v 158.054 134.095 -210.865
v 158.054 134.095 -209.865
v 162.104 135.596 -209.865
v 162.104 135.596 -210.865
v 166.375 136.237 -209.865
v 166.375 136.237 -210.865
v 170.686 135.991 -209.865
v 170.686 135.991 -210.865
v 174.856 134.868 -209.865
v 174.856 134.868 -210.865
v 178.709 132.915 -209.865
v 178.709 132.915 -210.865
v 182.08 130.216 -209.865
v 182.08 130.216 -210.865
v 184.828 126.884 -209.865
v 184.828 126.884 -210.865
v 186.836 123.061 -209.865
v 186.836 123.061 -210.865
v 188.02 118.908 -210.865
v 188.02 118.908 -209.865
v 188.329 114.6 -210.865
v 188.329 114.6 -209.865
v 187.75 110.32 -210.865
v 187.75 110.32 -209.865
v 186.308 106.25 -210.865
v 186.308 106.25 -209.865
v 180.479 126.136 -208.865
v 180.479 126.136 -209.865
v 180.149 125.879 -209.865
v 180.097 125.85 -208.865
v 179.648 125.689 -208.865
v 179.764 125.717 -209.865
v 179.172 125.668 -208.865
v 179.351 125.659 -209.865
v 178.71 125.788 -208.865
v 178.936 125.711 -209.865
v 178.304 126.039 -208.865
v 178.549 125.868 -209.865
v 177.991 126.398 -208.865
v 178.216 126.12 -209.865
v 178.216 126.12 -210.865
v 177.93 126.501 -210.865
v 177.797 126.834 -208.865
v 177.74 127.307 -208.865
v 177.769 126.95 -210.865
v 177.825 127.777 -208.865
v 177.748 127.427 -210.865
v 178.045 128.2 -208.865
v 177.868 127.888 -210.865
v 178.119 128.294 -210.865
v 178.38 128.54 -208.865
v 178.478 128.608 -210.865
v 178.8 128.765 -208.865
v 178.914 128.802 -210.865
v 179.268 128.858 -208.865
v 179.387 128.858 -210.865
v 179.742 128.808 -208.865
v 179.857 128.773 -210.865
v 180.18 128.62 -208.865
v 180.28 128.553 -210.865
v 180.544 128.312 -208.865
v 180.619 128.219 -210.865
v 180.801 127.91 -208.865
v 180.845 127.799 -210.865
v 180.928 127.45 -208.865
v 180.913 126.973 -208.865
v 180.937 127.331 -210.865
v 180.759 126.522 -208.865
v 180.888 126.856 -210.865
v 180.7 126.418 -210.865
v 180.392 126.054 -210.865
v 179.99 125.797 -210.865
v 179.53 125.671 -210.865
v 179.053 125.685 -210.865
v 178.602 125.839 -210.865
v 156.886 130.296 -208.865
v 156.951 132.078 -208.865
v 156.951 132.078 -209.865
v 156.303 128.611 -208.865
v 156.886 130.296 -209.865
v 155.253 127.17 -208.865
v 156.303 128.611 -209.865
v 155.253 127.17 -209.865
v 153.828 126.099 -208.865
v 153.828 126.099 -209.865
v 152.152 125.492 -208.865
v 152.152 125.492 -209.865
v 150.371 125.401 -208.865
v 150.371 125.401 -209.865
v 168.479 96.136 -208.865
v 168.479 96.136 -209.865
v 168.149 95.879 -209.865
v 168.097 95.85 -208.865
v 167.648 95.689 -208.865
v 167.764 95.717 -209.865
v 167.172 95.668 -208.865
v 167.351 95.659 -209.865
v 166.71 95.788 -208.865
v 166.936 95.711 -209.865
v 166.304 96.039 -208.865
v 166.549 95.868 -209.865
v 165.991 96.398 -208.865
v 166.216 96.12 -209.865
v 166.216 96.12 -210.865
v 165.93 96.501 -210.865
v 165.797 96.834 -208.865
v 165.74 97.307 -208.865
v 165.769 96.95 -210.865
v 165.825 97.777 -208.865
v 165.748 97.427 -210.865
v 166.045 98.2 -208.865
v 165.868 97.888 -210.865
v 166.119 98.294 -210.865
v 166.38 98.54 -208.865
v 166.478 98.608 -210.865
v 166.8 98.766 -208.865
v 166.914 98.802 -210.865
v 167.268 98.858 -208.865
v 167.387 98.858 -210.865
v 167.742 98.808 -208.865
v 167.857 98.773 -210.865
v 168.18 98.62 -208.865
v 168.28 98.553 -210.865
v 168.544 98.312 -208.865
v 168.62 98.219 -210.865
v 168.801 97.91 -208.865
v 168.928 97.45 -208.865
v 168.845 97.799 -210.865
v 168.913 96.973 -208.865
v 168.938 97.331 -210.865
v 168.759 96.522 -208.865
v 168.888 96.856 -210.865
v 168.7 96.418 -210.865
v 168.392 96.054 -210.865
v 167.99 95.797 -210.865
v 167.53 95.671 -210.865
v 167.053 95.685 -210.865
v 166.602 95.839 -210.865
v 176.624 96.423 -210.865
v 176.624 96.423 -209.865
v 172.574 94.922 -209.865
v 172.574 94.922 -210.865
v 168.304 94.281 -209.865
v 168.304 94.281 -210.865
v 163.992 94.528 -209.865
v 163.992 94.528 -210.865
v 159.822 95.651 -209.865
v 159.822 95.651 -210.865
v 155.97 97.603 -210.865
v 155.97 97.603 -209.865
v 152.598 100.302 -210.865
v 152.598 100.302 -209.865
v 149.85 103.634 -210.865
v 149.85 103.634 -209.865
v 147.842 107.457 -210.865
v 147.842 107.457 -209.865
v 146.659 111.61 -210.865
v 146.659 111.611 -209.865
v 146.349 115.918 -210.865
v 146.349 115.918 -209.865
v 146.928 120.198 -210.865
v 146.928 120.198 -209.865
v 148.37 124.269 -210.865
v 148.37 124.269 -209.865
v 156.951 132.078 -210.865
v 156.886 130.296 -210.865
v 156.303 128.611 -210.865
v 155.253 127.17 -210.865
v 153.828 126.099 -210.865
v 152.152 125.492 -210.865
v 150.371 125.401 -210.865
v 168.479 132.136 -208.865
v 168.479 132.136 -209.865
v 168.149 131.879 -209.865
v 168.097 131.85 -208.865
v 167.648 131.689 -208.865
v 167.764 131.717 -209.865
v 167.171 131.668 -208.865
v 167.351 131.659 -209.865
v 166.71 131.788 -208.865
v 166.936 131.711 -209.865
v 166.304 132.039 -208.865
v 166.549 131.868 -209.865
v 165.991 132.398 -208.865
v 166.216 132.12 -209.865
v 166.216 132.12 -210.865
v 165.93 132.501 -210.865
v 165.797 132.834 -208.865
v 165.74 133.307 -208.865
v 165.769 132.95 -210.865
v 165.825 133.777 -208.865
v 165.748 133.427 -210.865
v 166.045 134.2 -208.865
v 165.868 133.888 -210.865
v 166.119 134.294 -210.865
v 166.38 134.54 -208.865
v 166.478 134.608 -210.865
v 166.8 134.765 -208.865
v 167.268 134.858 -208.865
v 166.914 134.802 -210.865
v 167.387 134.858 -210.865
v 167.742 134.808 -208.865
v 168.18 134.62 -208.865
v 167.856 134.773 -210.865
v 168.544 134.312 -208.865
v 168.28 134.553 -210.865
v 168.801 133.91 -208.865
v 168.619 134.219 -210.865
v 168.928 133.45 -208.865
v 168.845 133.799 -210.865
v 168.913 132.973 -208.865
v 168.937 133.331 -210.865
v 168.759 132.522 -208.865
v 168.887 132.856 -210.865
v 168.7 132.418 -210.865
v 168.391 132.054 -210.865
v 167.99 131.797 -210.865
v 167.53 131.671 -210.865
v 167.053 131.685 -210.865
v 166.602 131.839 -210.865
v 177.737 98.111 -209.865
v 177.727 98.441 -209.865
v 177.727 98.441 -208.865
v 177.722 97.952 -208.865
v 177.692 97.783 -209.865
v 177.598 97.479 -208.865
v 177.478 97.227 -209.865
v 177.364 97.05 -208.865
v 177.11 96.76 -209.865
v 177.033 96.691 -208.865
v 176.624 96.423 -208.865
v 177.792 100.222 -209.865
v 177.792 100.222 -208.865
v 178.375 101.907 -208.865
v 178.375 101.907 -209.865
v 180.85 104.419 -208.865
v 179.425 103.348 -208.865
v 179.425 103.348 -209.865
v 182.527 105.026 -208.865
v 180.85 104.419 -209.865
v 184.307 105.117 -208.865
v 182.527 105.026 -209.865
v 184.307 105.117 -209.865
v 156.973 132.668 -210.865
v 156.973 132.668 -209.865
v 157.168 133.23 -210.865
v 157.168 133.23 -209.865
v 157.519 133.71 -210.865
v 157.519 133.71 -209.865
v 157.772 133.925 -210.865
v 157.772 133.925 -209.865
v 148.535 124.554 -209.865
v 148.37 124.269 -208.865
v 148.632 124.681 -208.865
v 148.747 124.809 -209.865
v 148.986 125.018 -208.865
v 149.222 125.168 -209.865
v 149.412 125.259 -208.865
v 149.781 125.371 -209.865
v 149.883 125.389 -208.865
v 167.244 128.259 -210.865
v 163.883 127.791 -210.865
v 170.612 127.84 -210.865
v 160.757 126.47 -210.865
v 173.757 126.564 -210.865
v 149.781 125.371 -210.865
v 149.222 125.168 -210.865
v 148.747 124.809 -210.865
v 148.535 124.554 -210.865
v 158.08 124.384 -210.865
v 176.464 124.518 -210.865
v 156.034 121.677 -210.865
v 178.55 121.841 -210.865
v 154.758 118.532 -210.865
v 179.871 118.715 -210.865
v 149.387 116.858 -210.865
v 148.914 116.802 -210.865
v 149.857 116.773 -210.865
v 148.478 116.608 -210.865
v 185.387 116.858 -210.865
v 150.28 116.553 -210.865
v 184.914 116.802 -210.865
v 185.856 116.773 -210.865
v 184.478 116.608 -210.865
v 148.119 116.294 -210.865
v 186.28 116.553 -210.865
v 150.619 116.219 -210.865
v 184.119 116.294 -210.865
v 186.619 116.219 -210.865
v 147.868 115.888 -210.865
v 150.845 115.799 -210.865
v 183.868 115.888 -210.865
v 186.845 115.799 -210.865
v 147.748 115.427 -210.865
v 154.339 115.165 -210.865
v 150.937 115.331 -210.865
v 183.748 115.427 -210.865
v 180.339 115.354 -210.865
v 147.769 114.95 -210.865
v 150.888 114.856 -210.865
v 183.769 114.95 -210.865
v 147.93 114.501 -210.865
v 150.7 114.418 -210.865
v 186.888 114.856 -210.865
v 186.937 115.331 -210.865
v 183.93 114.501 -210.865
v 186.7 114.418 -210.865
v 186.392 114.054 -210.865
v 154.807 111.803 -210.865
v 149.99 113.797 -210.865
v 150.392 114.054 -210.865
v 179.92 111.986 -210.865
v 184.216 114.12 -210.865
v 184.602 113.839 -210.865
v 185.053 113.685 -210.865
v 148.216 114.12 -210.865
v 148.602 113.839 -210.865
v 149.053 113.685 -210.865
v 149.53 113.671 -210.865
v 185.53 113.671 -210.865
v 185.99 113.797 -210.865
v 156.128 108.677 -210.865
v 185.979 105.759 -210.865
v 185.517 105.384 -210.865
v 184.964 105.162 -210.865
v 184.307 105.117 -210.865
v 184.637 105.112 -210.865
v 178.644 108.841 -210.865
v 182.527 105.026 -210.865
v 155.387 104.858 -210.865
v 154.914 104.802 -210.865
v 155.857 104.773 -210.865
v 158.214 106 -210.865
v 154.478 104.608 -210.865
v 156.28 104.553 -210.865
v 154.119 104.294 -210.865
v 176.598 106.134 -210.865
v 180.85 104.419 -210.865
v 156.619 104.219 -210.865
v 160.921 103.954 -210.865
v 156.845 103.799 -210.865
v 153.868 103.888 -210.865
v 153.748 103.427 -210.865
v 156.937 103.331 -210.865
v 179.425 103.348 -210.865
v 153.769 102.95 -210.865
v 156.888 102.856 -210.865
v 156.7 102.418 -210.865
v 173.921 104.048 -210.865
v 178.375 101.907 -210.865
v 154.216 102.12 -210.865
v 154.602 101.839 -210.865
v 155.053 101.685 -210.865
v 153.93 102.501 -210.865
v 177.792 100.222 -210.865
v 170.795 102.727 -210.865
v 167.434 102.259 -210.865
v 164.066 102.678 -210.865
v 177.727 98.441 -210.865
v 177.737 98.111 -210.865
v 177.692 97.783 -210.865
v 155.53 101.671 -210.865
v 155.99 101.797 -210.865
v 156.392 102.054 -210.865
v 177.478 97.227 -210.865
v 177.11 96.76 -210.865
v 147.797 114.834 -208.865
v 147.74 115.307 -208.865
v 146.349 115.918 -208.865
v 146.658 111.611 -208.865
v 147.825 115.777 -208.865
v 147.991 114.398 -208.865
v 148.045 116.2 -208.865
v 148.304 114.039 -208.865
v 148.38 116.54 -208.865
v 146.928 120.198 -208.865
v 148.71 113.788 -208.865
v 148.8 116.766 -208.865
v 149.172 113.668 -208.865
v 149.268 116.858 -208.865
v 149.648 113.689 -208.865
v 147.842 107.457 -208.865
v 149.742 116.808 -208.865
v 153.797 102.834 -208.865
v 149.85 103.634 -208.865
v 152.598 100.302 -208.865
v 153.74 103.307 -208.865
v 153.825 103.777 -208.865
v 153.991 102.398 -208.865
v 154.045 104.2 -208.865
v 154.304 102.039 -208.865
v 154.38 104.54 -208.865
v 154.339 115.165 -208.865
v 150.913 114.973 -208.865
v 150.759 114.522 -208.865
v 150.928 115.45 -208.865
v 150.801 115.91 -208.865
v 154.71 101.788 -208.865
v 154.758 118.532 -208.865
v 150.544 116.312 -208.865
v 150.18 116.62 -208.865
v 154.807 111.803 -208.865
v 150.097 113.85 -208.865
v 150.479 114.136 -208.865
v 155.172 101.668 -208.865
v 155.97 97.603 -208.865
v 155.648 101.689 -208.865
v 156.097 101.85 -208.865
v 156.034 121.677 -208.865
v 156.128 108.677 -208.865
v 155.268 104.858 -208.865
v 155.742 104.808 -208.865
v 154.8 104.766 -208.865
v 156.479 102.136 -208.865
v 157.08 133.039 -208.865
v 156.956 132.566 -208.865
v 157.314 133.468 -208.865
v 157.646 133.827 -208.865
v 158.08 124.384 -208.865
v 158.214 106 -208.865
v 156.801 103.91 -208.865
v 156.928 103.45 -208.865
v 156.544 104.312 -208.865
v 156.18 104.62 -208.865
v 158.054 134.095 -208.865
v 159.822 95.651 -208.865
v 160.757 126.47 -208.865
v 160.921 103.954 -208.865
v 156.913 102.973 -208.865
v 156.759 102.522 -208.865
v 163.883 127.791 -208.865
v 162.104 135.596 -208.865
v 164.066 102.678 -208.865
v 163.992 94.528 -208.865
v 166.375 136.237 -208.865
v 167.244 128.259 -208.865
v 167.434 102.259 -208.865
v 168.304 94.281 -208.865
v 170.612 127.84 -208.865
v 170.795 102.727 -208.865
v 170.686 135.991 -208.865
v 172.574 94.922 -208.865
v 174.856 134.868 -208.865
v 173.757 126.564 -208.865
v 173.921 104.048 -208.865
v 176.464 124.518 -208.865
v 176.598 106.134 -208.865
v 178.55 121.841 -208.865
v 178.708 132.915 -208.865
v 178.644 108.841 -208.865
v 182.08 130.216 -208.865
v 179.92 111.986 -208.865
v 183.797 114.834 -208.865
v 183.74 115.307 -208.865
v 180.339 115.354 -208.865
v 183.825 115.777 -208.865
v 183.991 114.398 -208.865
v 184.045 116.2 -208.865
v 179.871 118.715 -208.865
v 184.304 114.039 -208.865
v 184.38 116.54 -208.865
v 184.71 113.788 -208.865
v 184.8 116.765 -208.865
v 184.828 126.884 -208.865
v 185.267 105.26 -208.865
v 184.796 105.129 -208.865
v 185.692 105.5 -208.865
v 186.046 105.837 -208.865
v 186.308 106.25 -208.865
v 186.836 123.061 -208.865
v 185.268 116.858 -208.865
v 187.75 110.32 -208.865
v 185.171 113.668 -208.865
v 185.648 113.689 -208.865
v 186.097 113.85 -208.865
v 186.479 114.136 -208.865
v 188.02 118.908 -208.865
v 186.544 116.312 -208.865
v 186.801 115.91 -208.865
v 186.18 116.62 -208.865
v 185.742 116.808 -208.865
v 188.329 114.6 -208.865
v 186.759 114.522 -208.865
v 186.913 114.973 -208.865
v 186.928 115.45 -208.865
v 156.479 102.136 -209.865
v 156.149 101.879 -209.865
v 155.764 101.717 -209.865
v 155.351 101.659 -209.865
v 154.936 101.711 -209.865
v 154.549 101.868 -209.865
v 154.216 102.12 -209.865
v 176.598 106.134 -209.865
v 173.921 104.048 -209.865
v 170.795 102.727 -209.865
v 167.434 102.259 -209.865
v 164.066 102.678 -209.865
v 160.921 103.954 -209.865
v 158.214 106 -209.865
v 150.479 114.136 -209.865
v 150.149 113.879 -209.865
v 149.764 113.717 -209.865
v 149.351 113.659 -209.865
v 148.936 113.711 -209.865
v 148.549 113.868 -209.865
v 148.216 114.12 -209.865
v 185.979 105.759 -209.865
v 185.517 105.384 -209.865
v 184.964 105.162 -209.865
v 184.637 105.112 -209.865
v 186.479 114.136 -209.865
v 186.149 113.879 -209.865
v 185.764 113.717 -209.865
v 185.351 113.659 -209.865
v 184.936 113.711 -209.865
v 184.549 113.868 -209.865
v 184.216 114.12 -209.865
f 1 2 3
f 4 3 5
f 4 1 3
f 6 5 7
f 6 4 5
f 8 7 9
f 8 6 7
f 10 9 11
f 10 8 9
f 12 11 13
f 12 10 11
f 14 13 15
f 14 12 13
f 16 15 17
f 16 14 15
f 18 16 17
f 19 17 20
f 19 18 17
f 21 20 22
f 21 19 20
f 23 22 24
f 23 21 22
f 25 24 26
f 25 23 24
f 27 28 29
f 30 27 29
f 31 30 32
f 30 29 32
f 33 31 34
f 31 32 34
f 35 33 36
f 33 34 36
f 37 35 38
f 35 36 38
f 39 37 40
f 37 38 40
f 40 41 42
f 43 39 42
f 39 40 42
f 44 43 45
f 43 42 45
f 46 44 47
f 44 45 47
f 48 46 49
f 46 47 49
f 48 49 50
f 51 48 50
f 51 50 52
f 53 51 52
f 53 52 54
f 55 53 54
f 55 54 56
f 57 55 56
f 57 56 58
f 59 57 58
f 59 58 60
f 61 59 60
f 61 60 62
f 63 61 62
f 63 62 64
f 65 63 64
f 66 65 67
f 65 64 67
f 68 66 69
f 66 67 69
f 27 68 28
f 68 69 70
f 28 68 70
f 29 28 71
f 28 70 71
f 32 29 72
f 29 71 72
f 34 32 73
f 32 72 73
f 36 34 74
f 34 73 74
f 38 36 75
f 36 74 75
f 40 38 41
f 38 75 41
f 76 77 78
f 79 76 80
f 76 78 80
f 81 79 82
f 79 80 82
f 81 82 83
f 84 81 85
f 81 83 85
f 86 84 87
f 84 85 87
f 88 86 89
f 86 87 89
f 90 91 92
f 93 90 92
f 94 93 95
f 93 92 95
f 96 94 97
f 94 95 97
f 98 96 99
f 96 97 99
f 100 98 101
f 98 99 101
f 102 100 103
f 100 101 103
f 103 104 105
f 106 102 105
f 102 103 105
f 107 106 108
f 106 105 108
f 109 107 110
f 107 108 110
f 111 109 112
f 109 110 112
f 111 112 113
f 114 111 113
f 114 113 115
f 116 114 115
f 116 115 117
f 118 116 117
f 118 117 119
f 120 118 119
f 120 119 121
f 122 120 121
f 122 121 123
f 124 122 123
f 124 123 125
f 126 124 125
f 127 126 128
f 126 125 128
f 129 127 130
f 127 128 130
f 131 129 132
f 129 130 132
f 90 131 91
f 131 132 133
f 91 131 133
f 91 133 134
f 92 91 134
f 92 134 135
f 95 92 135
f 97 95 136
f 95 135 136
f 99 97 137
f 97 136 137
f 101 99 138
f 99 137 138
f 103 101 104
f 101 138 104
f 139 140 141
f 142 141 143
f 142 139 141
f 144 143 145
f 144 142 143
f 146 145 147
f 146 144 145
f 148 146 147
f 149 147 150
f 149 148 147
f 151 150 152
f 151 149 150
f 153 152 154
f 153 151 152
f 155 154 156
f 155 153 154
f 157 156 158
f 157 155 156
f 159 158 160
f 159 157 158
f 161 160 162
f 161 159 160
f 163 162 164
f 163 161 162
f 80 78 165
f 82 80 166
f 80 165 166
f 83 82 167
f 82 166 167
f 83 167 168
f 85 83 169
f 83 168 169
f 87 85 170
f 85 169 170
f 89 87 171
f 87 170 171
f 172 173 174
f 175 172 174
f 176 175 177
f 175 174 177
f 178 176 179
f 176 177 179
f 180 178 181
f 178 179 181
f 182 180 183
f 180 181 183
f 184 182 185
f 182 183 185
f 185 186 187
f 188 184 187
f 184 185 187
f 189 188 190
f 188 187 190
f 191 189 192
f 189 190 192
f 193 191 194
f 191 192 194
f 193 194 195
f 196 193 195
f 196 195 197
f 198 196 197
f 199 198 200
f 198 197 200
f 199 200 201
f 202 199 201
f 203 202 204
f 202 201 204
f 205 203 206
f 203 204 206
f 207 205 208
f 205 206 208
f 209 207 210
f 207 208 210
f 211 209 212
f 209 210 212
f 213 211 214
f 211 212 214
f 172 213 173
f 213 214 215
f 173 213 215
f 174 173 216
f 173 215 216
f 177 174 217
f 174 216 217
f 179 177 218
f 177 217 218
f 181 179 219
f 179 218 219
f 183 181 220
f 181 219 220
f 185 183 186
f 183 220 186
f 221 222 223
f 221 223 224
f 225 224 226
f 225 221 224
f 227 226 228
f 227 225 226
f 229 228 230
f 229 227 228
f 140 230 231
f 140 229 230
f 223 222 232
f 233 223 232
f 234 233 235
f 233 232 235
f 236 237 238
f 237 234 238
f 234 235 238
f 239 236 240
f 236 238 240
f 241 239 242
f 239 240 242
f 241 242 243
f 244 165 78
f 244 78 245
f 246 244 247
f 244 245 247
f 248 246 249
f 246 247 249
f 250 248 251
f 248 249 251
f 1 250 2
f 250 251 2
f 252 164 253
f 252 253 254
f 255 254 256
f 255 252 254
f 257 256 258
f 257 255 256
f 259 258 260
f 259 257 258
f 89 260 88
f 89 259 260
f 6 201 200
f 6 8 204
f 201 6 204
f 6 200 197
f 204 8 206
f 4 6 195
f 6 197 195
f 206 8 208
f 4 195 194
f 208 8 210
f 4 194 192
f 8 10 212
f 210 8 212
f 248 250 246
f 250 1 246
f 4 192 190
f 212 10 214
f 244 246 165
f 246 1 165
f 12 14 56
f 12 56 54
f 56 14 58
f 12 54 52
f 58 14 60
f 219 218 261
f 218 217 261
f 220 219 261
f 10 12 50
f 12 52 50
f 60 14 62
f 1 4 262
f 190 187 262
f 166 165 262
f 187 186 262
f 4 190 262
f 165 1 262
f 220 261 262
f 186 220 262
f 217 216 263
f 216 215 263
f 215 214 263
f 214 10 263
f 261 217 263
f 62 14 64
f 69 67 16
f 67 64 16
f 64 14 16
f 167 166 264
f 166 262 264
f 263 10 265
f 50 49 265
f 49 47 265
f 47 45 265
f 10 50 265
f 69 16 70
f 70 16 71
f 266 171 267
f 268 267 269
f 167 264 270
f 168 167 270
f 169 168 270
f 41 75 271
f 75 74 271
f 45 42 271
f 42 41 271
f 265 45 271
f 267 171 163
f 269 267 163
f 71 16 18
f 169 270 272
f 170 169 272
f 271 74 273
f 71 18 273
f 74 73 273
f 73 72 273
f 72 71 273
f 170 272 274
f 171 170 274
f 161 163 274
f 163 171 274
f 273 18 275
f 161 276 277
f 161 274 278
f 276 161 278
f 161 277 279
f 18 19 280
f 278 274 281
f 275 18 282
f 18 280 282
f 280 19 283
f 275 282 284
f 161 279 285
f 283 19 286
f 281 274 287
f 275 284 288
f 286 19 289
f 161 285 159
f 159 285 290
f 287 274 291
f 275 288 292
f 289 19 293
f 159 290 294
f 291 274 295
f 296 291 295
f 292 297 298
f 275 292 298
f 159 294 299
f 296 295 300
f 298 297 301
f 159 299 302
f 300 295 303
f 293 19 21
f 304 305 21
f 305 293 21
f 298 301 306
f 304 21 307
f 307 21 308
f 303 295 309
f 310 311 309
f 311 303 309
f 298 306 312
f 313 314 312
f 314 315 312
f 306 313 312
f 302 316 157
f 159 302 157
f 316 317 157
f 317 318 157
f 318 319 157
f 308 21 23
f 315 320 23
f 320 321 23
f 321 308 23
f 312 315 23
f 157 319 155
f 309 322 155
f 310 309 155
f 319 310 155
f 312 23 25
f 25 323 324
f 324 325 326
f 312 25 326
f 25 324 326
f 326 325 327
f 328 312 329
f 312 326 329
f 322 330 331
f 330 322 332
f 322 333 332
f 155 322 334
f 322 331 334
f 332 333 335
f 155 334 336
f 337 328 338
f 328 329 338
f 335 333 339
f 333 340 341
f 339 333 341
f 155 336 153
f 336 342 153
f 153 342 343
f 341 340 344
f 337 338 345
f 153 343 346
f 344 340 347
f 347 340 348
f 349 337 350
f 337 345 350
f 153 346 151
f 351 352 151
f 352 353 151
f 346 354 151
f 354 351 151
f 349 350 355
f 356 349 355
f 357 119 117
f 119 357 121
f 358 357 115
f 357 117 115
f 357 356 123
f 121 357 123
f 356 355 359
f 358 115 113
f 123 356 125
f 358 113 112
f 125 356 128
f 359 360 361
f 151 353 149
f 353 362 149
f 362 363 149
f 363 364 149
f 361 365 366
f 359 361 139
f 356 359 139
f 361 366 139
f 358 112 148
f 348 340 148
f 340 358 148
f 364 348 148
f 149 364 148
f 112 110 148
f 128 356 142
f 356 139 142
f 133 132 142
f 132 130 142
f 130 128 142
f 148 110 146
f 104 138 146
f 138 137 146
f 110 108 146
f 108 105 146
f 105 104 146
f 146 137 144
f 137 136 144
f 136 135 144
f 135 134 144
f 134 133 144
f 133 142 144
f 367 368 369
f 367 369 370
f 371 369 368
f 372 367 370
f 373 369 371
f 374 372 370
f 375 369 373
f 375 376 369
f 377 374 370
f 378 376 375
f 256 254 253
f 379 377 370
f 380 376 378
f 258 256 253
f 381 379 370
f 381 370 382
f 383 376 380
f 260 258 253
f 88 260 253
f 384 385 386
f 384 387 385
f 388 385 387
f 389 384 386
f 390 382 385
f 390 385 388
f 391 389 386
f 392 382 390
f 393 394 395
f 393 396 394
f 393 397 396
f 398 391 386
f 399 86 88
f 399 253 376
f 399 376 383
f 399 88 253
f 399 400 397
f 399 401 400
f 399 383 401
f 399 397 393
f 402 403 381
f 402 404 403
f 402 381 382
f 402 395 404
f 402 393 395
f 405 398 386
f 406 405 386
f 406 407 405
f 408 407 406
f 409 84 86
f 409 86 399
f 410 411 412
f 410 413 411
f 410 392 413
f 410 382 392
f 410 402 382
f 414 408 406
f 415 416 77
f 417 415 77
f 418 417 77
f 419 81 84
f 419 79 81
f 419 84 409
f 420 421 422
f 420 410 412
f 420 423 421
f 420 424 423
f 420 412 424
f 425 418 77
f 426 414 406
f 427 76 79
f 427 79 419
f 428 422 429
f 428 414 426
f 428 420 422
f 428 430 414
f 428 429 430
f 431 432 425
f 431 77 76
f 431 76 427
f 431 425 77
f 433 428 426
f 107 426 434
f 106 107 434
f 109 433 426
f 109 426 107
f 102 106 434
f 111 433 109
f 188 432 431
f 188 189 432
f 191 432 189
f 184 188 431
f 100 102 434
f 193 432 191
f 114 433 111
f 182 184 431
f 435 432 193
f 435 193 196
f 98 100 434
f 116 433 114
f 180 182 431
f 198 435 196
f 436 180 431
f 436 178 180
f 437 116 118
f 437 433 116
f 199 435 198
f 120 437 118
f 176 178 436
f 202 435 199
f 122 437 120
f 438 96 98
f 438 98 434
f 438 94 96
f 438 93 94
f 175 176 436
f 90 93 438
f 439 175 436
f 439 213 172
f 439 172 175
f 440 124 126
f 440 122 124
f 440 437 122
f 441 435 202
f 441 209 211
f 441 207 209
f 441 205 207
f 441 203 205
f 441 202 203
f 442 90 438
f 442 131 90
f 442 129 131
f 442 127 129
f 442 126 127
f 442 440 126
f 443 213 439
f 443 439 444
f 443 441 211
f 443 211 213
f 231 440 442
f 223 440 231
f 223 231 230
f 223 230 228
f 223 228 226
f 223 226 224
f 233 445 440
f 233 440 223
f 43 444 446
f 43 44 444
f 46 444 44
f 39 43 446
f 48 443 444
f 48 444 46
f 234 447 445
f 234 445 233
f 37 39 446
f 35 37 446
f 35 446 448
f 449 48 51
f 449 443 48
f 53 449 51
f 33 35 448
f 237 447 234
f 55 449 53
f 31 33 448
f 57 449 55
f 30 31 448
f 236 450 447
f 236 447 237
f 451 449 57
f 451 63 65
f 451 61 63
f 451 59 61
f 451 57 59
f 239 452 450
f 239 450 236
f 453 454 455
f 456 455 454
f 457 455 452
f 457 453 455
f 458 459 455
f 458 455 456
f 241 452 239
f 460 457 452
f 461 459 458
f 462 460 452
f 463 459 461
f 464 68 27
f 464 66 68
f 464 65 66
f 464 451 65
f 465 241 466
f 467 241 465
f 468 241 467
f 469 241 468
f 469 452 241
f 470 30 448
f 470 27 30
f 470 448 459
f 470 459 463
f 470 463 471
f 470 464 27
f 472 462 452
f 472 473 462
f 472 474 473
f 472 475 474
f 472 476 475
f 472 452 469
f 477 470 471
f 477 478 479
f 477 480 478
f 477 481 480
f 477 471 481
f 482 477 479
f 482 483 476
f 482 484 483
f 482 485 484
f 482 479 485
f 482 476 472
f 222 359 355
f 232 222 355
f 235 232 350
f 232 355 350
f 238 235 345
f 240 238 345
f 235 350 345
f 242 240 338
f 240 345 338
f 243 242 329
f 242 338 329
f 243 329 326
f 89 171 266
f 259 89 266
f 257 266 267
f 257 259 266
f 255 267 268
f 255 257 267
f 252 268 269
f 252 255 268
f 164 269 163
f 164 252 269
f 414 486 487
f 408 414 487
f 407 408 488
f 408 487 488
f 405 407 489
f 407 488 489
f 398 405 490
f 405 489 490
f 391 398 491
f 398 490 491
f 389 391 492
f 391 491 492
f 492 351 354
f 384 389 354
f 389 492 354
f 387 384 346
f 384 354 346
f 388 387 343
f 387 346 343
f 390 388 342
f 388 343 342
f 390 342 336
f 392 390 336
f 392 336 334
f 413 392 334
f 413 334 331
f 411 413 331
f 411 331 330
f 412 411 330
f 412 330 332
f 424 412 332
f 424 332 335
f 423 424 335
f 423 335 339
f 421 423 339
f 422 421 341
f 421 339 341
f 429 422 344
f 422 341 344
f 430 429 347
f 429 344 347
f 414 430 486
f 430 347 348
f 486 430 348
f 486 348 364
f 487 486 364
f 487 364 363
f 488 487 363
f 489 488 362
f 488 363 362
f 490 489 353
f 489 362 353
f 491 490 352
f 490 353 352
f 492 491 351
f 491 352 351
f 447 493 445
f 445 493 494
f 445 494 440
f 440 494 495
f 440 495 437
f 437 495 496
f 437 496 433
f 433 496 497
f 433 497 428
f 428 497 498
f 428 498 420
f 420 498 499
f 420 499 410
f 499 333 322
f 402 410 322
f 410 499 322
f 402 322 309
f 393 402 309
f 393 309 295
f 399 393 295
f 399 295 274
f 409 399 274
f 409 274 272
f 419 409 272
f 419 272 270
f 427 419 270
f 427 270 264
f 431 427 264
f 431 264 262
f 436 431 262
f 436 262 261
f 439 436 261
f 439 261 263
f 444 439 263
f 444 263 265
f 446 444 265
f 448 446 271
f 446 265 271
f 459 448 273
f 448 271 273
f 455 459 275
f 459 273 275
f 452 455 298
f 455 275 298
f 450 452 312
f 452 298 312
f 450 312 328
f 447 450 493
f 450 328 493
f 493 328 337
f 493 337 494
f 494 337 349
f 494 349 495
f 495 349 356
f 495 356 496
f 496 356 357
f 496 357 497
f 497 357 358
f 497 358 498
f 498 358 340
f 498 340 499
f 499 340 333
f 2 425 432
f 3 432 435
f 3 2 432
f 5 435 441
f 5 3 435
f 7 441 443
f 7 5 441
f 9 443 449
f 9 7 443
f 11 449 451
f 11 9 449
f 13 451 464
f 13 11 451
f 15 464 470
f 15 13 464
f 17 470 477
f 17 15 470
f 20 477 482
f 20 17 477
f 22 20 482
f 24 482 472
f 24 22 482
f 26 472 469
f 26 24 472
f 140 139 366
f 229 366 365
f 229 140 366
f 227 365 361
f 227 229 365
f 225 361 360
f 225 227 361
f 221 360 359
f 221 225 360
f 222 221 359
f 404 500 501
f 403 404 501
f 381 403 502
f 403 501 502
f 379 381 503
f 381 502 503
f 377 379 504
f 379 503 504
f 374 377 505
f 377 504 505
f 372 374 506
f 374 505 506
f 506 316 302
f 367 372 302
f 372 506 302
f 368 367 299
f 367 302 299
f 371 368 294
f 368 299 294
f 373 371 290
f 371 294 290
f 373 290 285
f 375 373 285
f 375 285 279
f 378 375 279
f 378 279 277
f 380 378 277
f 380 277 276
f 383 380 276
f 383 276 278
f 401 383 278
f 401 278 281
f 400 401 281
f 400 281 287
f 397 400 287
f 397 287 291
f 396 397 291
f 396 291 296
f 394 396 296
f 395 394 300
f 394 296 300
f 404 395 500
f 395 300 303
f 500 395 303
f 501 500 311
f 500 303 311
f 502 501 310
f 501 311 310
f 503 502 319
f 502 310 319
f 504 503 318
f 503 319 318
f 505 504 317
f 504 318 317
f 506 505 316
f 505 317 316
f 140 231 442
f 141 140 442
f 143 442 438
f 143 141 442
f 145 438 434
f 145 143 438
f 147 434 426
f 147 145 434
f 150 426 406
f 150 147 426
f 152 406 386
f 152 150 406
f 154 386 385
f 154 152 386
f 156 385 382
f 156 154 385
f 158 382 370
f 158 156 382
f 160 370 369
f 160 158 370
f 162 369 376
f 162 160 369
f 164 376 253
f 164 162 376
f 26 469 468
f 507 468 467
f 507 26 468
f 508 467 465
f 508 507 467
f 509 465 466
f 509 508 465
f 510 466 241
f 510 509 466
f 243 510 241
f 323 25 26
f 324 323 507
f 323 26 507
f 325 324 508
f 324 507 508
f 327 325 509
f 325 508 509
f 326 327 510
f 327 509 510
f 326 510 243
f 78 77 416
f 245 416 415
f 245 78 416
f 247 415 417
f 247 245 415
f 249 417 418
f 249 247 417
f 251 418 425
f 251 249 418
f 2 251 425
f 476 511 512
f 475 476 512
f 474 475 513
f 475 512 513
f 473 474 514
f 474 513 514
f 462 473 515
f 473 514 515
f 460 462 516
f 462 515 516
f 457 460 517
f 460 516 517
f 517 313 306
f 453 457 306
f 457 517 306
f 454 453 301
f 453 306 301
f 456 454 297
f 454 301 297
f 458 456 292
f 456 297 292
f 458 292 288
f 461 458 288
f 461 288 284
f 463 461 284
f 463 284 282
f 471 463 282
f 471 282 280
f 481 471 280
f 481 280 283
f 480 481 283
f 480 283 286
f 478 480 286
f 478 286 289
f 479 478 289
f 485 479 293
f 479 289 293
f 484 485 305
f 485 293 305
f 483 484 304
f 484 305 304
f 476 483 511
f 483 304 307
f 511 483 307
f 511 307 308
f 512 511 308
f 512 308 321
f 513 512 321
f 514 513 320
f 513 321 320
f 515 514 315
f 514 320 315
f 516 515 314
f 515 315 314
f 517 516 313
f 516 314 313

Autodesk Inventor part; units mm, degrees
ref_plane "YZ Plane" through (0, 0, 0) normal (1, 0, 0) x (0, 1, 0)
ref_plane "XZ Plane" through (0, 0, 0) normal (0, 1, 0) x (-1, 0, 0)
ref_plane "작업 평면1" through (168.9405, 113.6809, -210.8653) normal (0, 0, 1) x (-0.7019406, -0.7122354, 0)
sketch "스케치1" plane through (168.9405, 113.6809, -210.8653) normal (0, 0, 1) x (-0.7019406, -0.7122354, 0)
  circle A0 centre (0, -25.2484) radius 3 projected
  circle A1 centre (0, -2.2484) radius 13 projected
  circle A2 centre (-12.6349, 10.5718) radius 1.6 projected
  circle A3 centre (12.6349, -15.0687) radius 1.6 projected
  circle A4 centre (0.1235, 14.7217) radius 1.6 projected
  circle A5 centre (-0.1235, -19.2186) radius 1.6 projected
  circle A6 centre (-16.9701, -2.1249) radius 1.6 projected
  circle A7 centre (16.9701, -2.372) radius 1.6 projected
  circle A8 centre (12.8202, 10.3865) radius 1.6 projected
  circle A9 centre (-12.8202, -14.8834) radius 1.6 projected
  circle A10 centre (0, 20.7516) radius 3 projected
  arc A11 (-2.0317, -50.1272) -> (-0.57, -54.2453) centre (7.4248, -49.0892) ccw projected
  line L0 (0.57, -54.2453) -> (-0.57, -54.2453) projected
  arc A12 (0.57, -54.2453) -> (2.0317, -50.1272) centre (-7.4248, -49.0892) ccw projected
  arc A13 (2.5023, -49.6825) -> (2.0317, -50.1272) centre (2.5287, -50.1818) ccw projected
  arc A14 (2.5023, -49.6825) -> (3.4624, -49.6221) centre (0, -2.2484) ccw projected
  arc A15 (3.9852, -50.0043) -> (3.4624, -49.6221) centre (3.4989, -50.1207) ccw projected
  arc A16 (3.9852, -50.0043) -> (5.9514, -53.9067) centre (13.237, -47.7893) ccw projected
  line L1 (7.0824, -53.7639) -> (5.9514, -53.9067) projected
  arc A17 (7.0824, -53.7639) -> (8.0165, -49.4951) centre (-1.4956, -49.6504) ccw projected
  arc A18 (8.4277, -48.9948) -> (8.0165, -49.4951) centre (8.5164, -49.4869) ccw projected
  arc A19 (8.4277, -48.9948) -> (9.3726, -48.8146) centre (0, -2.2484) ccw projected
  arc A20 (9.9391, -49.1283) -> (9.3726, -48.8146) centre (9.4713, -49.3047) ccw projected
  arc A21 (9.9391, -49.1283) -> (12.379, -52.7535) centre (18.8404, -45.7711) ccw projected
  line L2 (13.4832, -52.47) -> (12.379, -52.7535) projected
  arc A22 (13.4832, -52.47) -> (13.8748, -48.1178) centre (4.4572, -49.4641) ccw projected
  arc A23 (14.2201, -47.5699) -> (13.8748, -48.1178) centre (14.3698, -48.047) ccw projected
  arc A24 (14.2201, -47.5699) -> (15.135, -47.2727) centre (0, -2.2484) ccw projected
  arc A25 (15.7364, -47.5129) -> (15.135, -47.2727) centre (15.2943, -47.7466) ccw projected
  arc A26 (15.7364, -47.5129) -> (18.6114, -50.8037) centre (24.1467, -43.0666) ccw projected
  line L3 (19.6713, -50.3841) -> (18.6114, -50.8037) projected
  arc A27 (19.6713, -50.3841) -> (19.5144, -46.0171) centre (10.3398, -48.5331) ccw projected
  arc A28 (19.7883, -45.4303) -> (19.5144, -46.0171) centre (19.9966, -45.8849) ccw projected
  arc A29 (19.7883, -45.4303) -> (20.6587, -45.0207) centre (0, -2.2484) ccw projected
  arc A30 (21.2854, -45.1837) -> (20.6587, -45.0207) centre (20.8762, -45.471) ccw projected
  arc A31 (21.2854, -45.1837) -> (24.5502, -48.0882) centre (29.0721, -39.7184) ccw projected
  line L4 (25.5492, -47.539) -> (24.5502, -48.0882) projected
  arc A32 (25.5492, -47.539) -> (24.8461, -43.2262) centre (16.0593, -46.8722) ccw projected
  arc A33 (25.0443, -42.6097) -> (24.8461, -43.2262) centre (25.308, -43.0345) ccw projected
  arc A34 (25.0443, -42.6097) -> (25.8566, -42.0942) centre (0, -2.2484) ccw projected
  arc A35 (26.4988, -42.1774) -> (25.8566, -42.0942) centre (26.1288, -42.5137) ccw projected
  arc A36 (26.4988, -42.1774) -> (30.1019, -44.6498) centre (33.5391, -35.7792) ccw projected
  line L5 (31.0241, -43.9798) -> (30.1019, -44.6498) projected
  arc A37 (31.0241, -43.9798) -> (29.7861, -39.789) centre (21.5255, -44.5076) ccw projected
  arc A38 (29.9055, -39.1525) -> (29.7861, -39.789) centre (30.2203, -39.541) ccw projected
  arc A39 (29.9055, -39.1525) -> (30.6467, -38.5393) centre (0, -2.2484) ccw projected
  arc A40 (31.2943, -38.5413) -> (30.6467, -38.5393) centre (30.9693, -38.9213) ccw projected
  arc A41 (31.2943, -38.5413) -> (35.1788, -40.5427) centre (37.4772, -31.3112) ccw projected
  line L6 (36.0098, -39.7623) -> (35.1788, -40.5427) projected
  arc A42 (36.0098, -39.7623) -> (34.2563, -35.7598) centre (26.6522, -41.4765) ccw projected
  arc A43 (34.295, -35.1134) -> (34.2563, -35.7598) centre (34.656, -35.4593) ccw projected
  arc A44 (34.295, -35.1134) -> (34.9535, -34.4121) centre (0, -2.2484) ccw projected
  arc A45 (35.5962, -34.333) -> (34.9535, -34.4121) centre (35.3214, -34.7507) ccw projected
  arc A46 (35.5962, -34.333) -> (39.7009, -35.8317) centre (40.8242, -26.3849) ccw projected
  line L7 (40.4276, -34.9533) -> (39.7009, -35.8317) projected
  arc A47 (40.4276, -34.9533) -> (38.1863, -31.2021) centre (31.3586, -37.8268) ccw projected
  arc A48 (38.1436, -30.5559) -> (38.1863, -31.2021) centre (38.5451, -30.8539) ccw projected
  arc A49 (38.1436, -30.5559) -> (38.7091, -29.7777) centre (0, -2.2484) ccw projected
  arc A50 (39.3368, -29.6186) -> (38.7091, -29.7777) centre (39.1165, -30.0674) ccw projected
  arc A51 (39.3368, -29.6186) -> (43.597, -30.591) centre (43.5274, -21.078) ccw projected
  line L8 (44.2078, -29.6285) -> (43.597, -30.591) projected
  arc A52 (44.2078, -29.6285) -> (41.514, -26.1878) centre (35.5705, -33.616) ccw projected
  arc A53 (41.3907, -25.5521) -> (41.514, -26.1878) centre (41.8264, -25.7974) ccw projected
  arc A54 (41.3907, -25.5521) -> (41.8542, -24.7091) centre (0, -2.2484) ccw projected
  arc A55 (42.457, -24.4725) -> (41.8542, -24.7091) centre (42.2947, -24.9455) ccw projected
  arc A56 (42.457, -24.4725) -> (46.8055, -24.9034) centre (45.5441, -15.4741) ccw projected
  line L9 (47.2909, -23.8719) -> (46.8055, -24.9034) projected
  arc A57 (47.2909, -23.8719) -> (44.1871, -20.7959) centre (39.2214, -28.9105) ccw projected
  arc A58 (43.985, -20.1807) -> (44.1871, -20.7959) centre (44.4481, -20.3694) ccw projected
  arc A59 (43.985, -20.1807) -> (44.3392, -19.2862) centre (0, -2.2484) ccw projected
  arc A60 (44.9076, -18.976) -> (44.3392, -19.2862) centre (44.8059, -19.4656) ccw projected
  arc A61 (44.9076, -18.976) -> (49.2758, -18.8585) centre (46.8426, -9.6616) ccw projected
  line L10 (49.6281, -17.7743) -> (49.2758, -18.8585) projected
  arc A62 (49.6281, -17.7743) -> (46.1633, -15.1116) centre (42.2538, -23.7845) ccw projected
  arc A63 (45.8857, -14.5265) -> (46.1633, -15.1116) centre (46.3687, -14.6557) ccw projected
  arc A64 (45.8857, -14.5265) -> (46.125, -13.5947) centre (0, -2.2484) ccw projected
  arc A65 (46.65, -13.2157) -> (46.125, -13.5947) centre (46.6105, -13.7141) ccw projected
  arc A66 (46.65, -13.2157) -> (50.9691, -12.5516) centre (47.4023, -3.7322) ccw projected
  line L11 (51.1827, -11.4318) -> (50.9691, -12.5516) projected
  arc A67 (51.1827, -11.4318) -> (47.4114, -9.2243) centre (44.6198, -18.3188) ccw projected
  arc A68 (47.0627, -8.6787) -> (47.4114, -9.2243) centre (47.5581, -8.7464) ccw projected
  arc A69 (47.0627, -8.6787) -> (47.1833, -7.7243) centre (0, -2.2484) ccw projected
  arc A70 (47.6567, -7.2824) -> (47.1833, -7.7243) centre (47.68, -7.7819) ccw projected
  arc A71 (47.6567, -7.2824) -> (51.8585, -6.0822) centre (47.2145, 2.2206) ccw projected
  line L12 (51.9301, -4.9445) -> (51.8585, -6.0822) projected
  arc A72 (51.9301, -4.9445) -> (47.9119, -3.2271) centre (46.2821, -12.5998) ccw projected
  arc A73 (47.4976, -2.7294) -> (47.9119, -3.2271) centre (47.9975, -2.7345) ccw projected
  arc A74 (47.4976, -2.7294) -> (47.4976, -1.7674) centre (0, -2.2484) ccw projected
  arc A75 (47.9119, -1.2698) -> (47.4976, -1.7674) centre (47.9975, -1.7624) ccw projected
  arc A76 (47.9119, -1.2698) -> (51.9301, 0.4476) centre (46.2821, 8.1029) ccw projected
  line L13 (51.8585, 1.5853) -> (51.9301, 0.4476) projected
  arc A77 (51.8585, 1.5853) -> (47.6567, 2.7856) centre (47.2145, -6.7175) ccw projected
  arc A78 (47.1833, 3.2274) -> (47.6567, 2.7856) centre (47.68, 3.285) ccw projected
  arc A79 (47.1833, 3.2274) -> (47.0627, 4.1818) centre (0, -2.2484) ccw projected
  arc A80 (47.4114, 4.7275) -> (47.0627, 4.1818) centre (47.5581, 4.2495) ccw projected
  arc A81 (47.4114, 4.7275) -> (51.1827, 6.9349) centre (44.6198, 13.822) ccw projected
  line L14 (50.9691, 8.0547) -> (51.1827, 6.9349) projected
  arc A82 (50.9691, 8.0547) -> (46.65, 8.7188) centre (47.4023, -0.7647) ccw projected
  arc A83 (46.125, 9.0978) -> (46.65, 8.7188) centre (46.6105, 9.2173) ccw projected
  arc A84 (46.125, 9.0978) -> (45.8857, 10.0296) centre (0, -2.2484) ccw projected
  arc A85 (46.1633, 10.6147) -> (45.8857, 10.0296) centre (46.3687, 10.1589) ccw projected
  arc A86 (46.1633, 10.6147) -> (49.6281, 13.2774) centre (42.2538, 19.2876) ccw projected
  line L15 (49.2758, 14.3616) -> (49.6281, 13.2774) projected
  arc A87 (49.2758, 14.3616) -> (44.9076, 14.4792) centre (46.8426, 5.1647) ccw projected
  arc A88 (44.3392, 14.7894) -> (44.9076, 14.4792) centre (44.8059, 14.9687) ccw projected
  arc A89 (44.3392, 14.7894) -> (43.985, 15.6838) centre (0, -2.2484) ccw projected
  arc A90 (44.1871, 16.299) -> (43.985, 15.6838) centre (44.4481, 15.8726) ccw projected
  arc A91 (44.1871, 16.299) -> (47.2909, 19.375) centre (39.2214, 24.4136) ccw projected
  line L16 (46.8055, 20.4065) -> (47.2909, 19.375) projected
  arc A92 (46.8055, 20.4065) -> (42.457, 19.9757) centre (45.5441, 10.9772) ccw projected
  arc A93 (41.8542, 20.2122) -> (42.457, 19.9757) centre (42.2947, 20.4486) ccw projected
  arc A94 (41.8542, 20.2122) -> (41.3907, 21.0552) centre (0, -2.2484) ccw projected
  arc A95 (41.514, 21.6909) -> (41.3907, 21.0552) centre (41.8264, 21.3005) ccw projected
  arc A96 (41.514, 21.6909) -> (44.2078, 25.1316) centre (35.5705, 29.1191) ccw projected
  line L17 (43.597, 26.0941) -> (44.2078, 25.1316) projected
  arc A97 (43.597, 26.0941) -> (39.3368, 25.1217) centre (43.5274, 16.5811) ccw projected
  arc A98 (38.7091, 25.2808) -> (39.3368, 25.1217) centre (39.1165, 25.5706) ccw projected
  arc A99 (38.7091, 25.2808) -> (38.1436, 26.0591) centre (0, -2.2484) ccw projected
  arc A100 (38.1863, 26.7052) -> (38.1436, 26.0591) centre (38.5451, 26.357) ccw projected
  arc A101 (38.1863, 26.7052) -> (40.4276, 30.4564) centre (31.3586, 33.3299) ccw projected
  line L18 (39.7009, 31.3348) -> (40.4276, 30.4564) projected
  arc A102 (39.7009, 31.3348) -> (35.5962, 29.8361) centre (40.8242, 21.888) ccw projected
  arc A103 (34.9535, 29.9152) -> (35.5962, 29.8361) centre (35.3214, 30.2538) ccw projected
  arc A104 (34.9535, 29.9152) -> (34.295, 30.6165) centre (0, -2.2484) ccw projected
  arc A105 (34.2563, 31.2629) -> (34.295, 30.6165) centre (34.656, 30.9625) ccw projected
  arc A106 (34.2563, 31.2629) -> (36.0098, 35.2655) centre (26.6522, 36.9797) ccw projected
  line L19 (35.1788, 36.0458) -> (36.0098, 35.2655) projected
  arc A107 (35.1788, 36.0458) -> (31.2943, 34.0445) centre (37.4772, 26.8143) ccw projected
  arc A108 (30.6467, 34.0425) -> (31.2943, 34.0445) centre (30.9693, 34.4245) ccw projected
  arc A109 (30.6467, 34.0425) -> (29.9055, 34.6557) centre (0, -2.2484) ccw projected
  arc A110 (29.7861, 35.2921) -> (29.9055, 34.6557) centre (30.2203, 35.0441) ccw projected
  arc A111 (29.7861, 35.2921) -> (31.0241, 39.4829) centre (21.5255, 40.0107) ccw projected
  line L20 (30.1019, 40.153) -> (31.0241, 39.4829) projected
  arc A112 (30.1019, 40.153) -> (26.4988, 37.6805) centre (33.5391, 31.2823) ccw projected
  arc A113 (25.8566, 37.5973) -> (26.4988, 37.6805) centre (26.1288, 38.0168) ccw projected
  arc A114 (25.8566, 37.5973) -> (25.0443, 38.1128) centre (0, -2.2484) ccw projected
  arc A115 (24.8461, 38.7293) -> (25.0443, 38.1128) centre (25.308, 38.5377) ccw projected
  arc A116 (24.8461, 38.7293) -> (25.5492, 43.0422) centre (16.0593, 42.3754) ccw projected
  line L21 (24.5502, 43.5914) -> (25.5492, 43.0422) projected
  arc A117 (24.5502, 43.5914) -> (21.2854, 40.6868) centre (29.0721, 35.2215) ccw projected
  arc A118 (20.6587, 40.5238) -> (21.2854, 40.6868) centre (20.8762, 40.9741) ccw projected
  arc A119 (20.6587, 40.5238) -> (19.7883, 40.9334) centre (0, -2.2484) ccw projected
  arc A120 (19.5144, 41.5202) -> (19.7883, 40.9334) centre (19.9966, 41.388) ccw projected
  arc A121 (19.5144, 41.5202) -> (19.6713, 45.8872) centre (10.3398, 44.0363) ccw projected
  line L22 (18.6114, 46.3069) -> (19.6713, 45.8872) projected
  arc A122 (18.6114, 46.3069) -> (15.7364, 43.016) centre (24.1467, 38.5697) ccw projected
  arc A123 (15.135, 42.7758) -> (15.7364, 43.016) centre (15.2943, 43.2497) ccw projected
  arc A124 (15.135, 42.7758) -> (14.2201, 43.0731) centre (0, -2.2484) ccw projected
  arc A125 (13.8748, 43.6209) -> (14.2201, 43.0731) centre (14.3698, 43.5501) ccw projected
  arc A126 (13.8748, 43.6209) -> (13.4832, 47.9731) centre (4.4572, 44.9672) ccw projected
  line L23 (12.379, 48.2566) -> (13.4832, 47.9731) projected
  arc A127 (12.379, 48.2566) -> (9.9391, 44.6314) centre (18.8404, 41.2742) ccw projected
  arc A128 (9.3726, 44.3177) -> (9.9391, 44.6314) centre (9.4713, 44.8079) ccw projected
  arc A129 (9.3726, 44.3177) -> (8.4277, 44.4979) centre (0, -2.2484) ccw projected
  arc A130 (8.0165, 44.9982) -> (8.4277, 44.4979) centre (8.5164, 44.99) ccw projected
  arc A131 (8.0165, 44.9982) -> (7.0824, 49.267) centre (-1.4956, 45.1535) ccw projected
  line L24 (5.9514, 49.4099) -> (7.0824, 49.267) projected
  arc A132 (5.9514, 49.4099) -> (3.9852, 45.5074) centre (13.237, 43.2924) ccw projected
  arc A133 (3.4624, 45.1252) -> (3.9852, 45.5074) centre (3.4989, 45.6239) ccw projected
  arc A134 (3.4624, 45.1252) -> (2.5023, 45.1856) centre (0, -2.2484) ccw projected
  arc A135 (2.0317, 45.6304) -> (2.5023, 45.1856) centre (2.5287, 45.6849) ccw projected
  arc A136 (2.0317, 45.6304) -> (0.57, 49.7484) centre (-7.4248, 44.5923) ccw projected
  line L25 (-0.57, 49.7484) -> (0.57, 49.7484) projected
  arc A137 (-0.57, 49.7484) -> (-2.0317, 45.6304) centre (7.4248, 44.5923) ccw projected
  arc A138 (-2.5023, 45.1856) -> (-2.0317, 45.6304) centre (-2.5287, 45.6849) ccw projected
  arc A139 (-2.5023, 45.1856) -> (-3.4624, 45.1252) centre (0, -2.2484) ccw projected
  arc A140 (-3.9852, 45.5074) -> (-3.4624, 45.1252) centre (-3.4989, 45.6239) ccw projected
  arc A141 (-3.9852, 45.5074) -> (-5.9514, 49.4099) centre (-13.237, 43.2924) ccw projected
  line L26 (-7.0824, 49.267) -> (-5.9514, 49.4099) projected
  arc A142 (-7.0824, 49.267) -> (-8.0165, 44.9982) centre (1.4956, 45.1535) ccw projected
  arc A143 (-8.4277, 44.4979) -> (-8.0165, 44.9982) centre (-8.5164, 44.99) ccw projected
  arc A144 (-8.4277, 44.4979) -> (-9.3726, 44.3177) centre (0, -2.2484) ccw projected
  arc A145 (-9.9391, 44.6314) -> (-9.3726, 44.3177) centre (-9.4713, 44.8079) ccw projected
  arc A146 (-9.9391, 44.6314) -> (-12.379, 48.2566) centre (-18.8404, 41.2742) ccw projected
  line L27 (-13.4832, 47.9731) -> (-12.379, 48.2566) projected
  arc A147 (-13.4832, 47.9731) -> (-13.8748, 43.6209) centre (-4.4572, 44.9672) ccw projected
  arc A148 (-14.2201, 43.0731) -> (-13.8748, 43.6209) centre (-14.3698, 43.5501) ccw projected
  arc A149 (-14.2201, 43.0731) -> (-15.135, 42.7758) centre (0, -2.2484) ccw projected
  arc A150 (-15.7364, 43.016) -> (-15.135, 42.7758) centre (-15.2943, 43.2497) ccw projected
  arc A151 (-15.7364, 43.016) -> (-18.6114, 46.3069) centre (-24.1467, 38.5697) ccw projected
  line L28 (-19.6713, 45.8872) -> (-18.6114, 46.3069) projected
  arc A152 (-19.6713, 45.8872) -> (-19.5144, 41.5202) centre (-10.3398, 44.0363) ccw projected
  arc A153 (-19.7883, 40.9334) -> (-19.5144, 41.5202) centre (-19.9966, 41.388) ccw projected
  arc A154 (-19.7883, 40.9334) -> (-20.6587, 40.5238) centre (0, -2.2484) ccw projected
  arc A155 (-21.2854, 40.6868) -> (-20.6587, 40.5238) centre (-20.8762, 40.9741) ccw projected
  arc A156 (-21.2854, 40.6868) -> (-24.5502, 43.5914) centre (-29.0721, 35.2215) ccw projected
  line L29 (-25.5492, 43.0422) -> (-24.5502, 43.5914) projected
  arc A157 (-25.5492, 43.0422) -> (-24.8461, 38.7293) centre (-16.0593, 42.3754) ccw projected
  arc A158 (-25.0443, 38.1128) -> (-24.8461, 38.7293) centre (-25.308, 38.5377) ccw projected
  arc A159 (-25.0443, 38.1128) -> (-25.8566, 37.5973) centre (0, -2.2484) ccw projected
  arc A160 (-26.4988, 37.6805) -> (-25.8566, 37.5973) centre (-26.1288, 38.0168) ccw projected
  arc A161 (-26.4988, 37.6805) -> (-30.1019, 40.153) centre (-33.5391, 31.2823) ccw projected
  line L30 (-31.0241, 39.4829) -> (-30.1019, 40.153) projected
  arc A162 (-31.0241, 39.4829) -> (-29.7861, 35.2921) centre (-21.5255, 40.0107) ccw projected
  arc A163 (-29.9055, 34.6557) -> (-29.7861, 35.2921) centre (-30.2203, 35.0441) ccw projected
  arc A164 (-29.9055, 34.6557) -> (-30.6467, 34.0425) centre (0, -2.2484) ccw projected
  arc A165 (-31.2943, 34.0445) -> (-30.6467, 34.0425) centre (-30.9693, 34.4245) ccw projected
  arc A166 (-31.2943, 34.0445) -> (-35.1788, 36.0458) centre (-37.4772, 26.8143) ccw projected
  line L31 (-36.0098, 35.2655) -> (-35.1788, 36.0458) projected
  arc A167 (-36.0098, 35.2655) -> (-34.2563, 31.2629) centre (-26.6522, 36.9797) ccw projected
  arc A168 (-34.295, 30.6165) -> (-34.2563, 31.2629) centre (-34.656, 30.9625) ccw projected
  arc A169 (-34.295, 30.6165) -> (-34.9535, 29.9152) centre (0, -2.2484) ccw projected
  arc A170 (-35.5962, 29.8361) -> (-34.9535, 29.9152) centre (-35.3214, 30.2538) ccw projected
  arc A171 (-35.5962, 29.8361) -> (-39.7009, 31.3348) centre (-40.8242, 21.888) ccw projected
  line L32 (-40.4276, 30.4564) -> (-39.7009, 31.3348) projected
  arc A172 (-40.4276, 30.4564) -> (-38.1863, 26.7052) centre (-31.3586, 33.3299) ccw projected
  arc A173 (-38.1436, 26.0591) -> (-38.1863, 26.7052) centre (-38.5451, 26.357) ccw projected
  arc A174 (-38.1436, 26.0591) -> (-38.7091, 25.2808) centre (0, -2.2484) ccw projected
  arc A175 (-39.3368, 25.1217) -> (-38.7091, 25.2808) centre (-39.1165, 25.5706) ccw projected
  arc A176 (-39.3368, 25.1217) -> (-43.597, 26.0941) centre (-43.5274, 16.5811) ccw projected
  line L33 (-44.2078, 25.1316) -> (-43.597, 26.0941) projected
  arc A177 (-44.2078, 25.1316) -> (-41.514, 21.6909) centre (-35.5705, 29.1191) ccw projected
  arc A178 (-41.3907, 21.0552) -> (-41.514, 21.6909) centre (-41.8264, 21.3005) ccw projected
  arc A179 (-41.3907, 21.0552) -> (-41.8542, 20.2122) centre (0, -2.2484) ccw projected
  arc A180 (-42.457, 19.9757) -> (-41.8542, 20.2122) centre (-42.2947, 20.4486) ccw projected
  arc A181 (-42.457, 19.9757) -> (-46.8055, 20.4065) centre (-45.5441, 10.9772) ccw projected
  line L34 (-47.2909, 19.375) -> (-46.8055, 20.4065) projected
  arc A182 (-47.2909, 19.375) -> (-44.1871, 16.299) centre (-39.2214, 24.4136) ccw projected
  arc A183 (-43.985, 15.6838) -> (-44.1871, 16.299) centre (-44.4481, 15.8726) ccw projected
  arc A184 (-43.985, 15.6838) -> (-44.3392, 14.7894) centre (0, -2.2484) ccw projected
  arc A185 (-44.9076, 14.4792) -> (-44.3392, 14.7894) centre (-44.8059, 14.9687) ccw projected
  arc A186 (-44.9076, 14.4792) -> (-49.2758, 14.3616) centre (-46.8426, 5.1647) ccw projected
  line L35 (-49.6281, 13.2774) -> (-49.2758, 14.3616) projected
  arc A187 (-49.6281, 13.2774) -> (-46.1633, 10.6147) centre (-42.2538, 19.2876) ccw projected
  arc A188 (-45.8857, 10.0296) -> (-46.1633, 10.6147) centre (-46.3687, 10.1589) ccw projected
  arc A189 (-45.8857, 10.0296) -> (-46.125, 9.0978) centre (0, -2.2484) ccw projected
  arc A190 (-46.65, 8.7188) -> (-46.125, 9.0978) centre (-46.6105, 9.2173) ccw projected
  arc A191 (-46.65, 8.7188) -> (-50.9691, 8.0547) centre (-47.4023, -0.7647) ccw projected
  line L36 (-51.1827, 6.9349) -> (-50.9691, 8.0547) projected
  arc A192 (-51.1827, 6.9349) -> (-47.4114, 4.7275) centre (-44.6198, 13.822) ccw projected
  arc A193 (-47.0627, 4.1818) -> (-47.4114, 4.7275) centre (-47.5581, 4.2495) ccw projected
  arc A194 (-47.0627, 4.1818) -> (-47.1833, 3.2274) centre (0, -2.2484) ccw projected
  arc A195 (-47.6567, 2.7856) -> (-47.1833, 3.2274) centre (-47.68, 3.285) ccw projected
  arc A196 (-47.6567, 2.7856) -> (-51.8585, 1.5853) centre (-47.2145, -6.7175) ccw projected
  line L37 (-51.9301, 0.4476) -> (-51.8585, 1.5853) projected
  arc A197 (-51.9301, 0.4476) -> (-47.9119, -1.2698) centre (-46.2821, 8.1029) ccw projected
  arc A198 (-47.4976, -1.7674) -> (-47.9119, -1.2698) centre (-47.9975, -1.7624) ccw projected
  arc A199 (-47.4976, -1.7674) -> (-47.4976, -2.7294) centre (0, -2.2484) ccw projected
  arc A200 (-47.9119, -3.2271) -> (-47.4976, -2.7294) centre (-47.9975, -2.7345) ccw projected
  arc A201 (-47.9119, -3.2271) -> (-51.9301, -4.9445) centre (-46.2821, -12.5998) ccw projected
  line L38 (-51.8585, -6.0822) -> (-51.9301, -4.9445) projected
  arc A202 (-51.8585, -6.0822) -> (-47.6567, -7.2824) centre (-47.2145, 2.2206) ccw projected
  arc A203 (-47.1833, -7.7243) -> (-47.6567, -7.2824) centre (-47.68, -7.7819) ccw projected
  arc A204 (-47.1833, -7.7243) -> (-47.0627, -8.6787) centre (0, -2.2484) ccw projected
  arc A205 (-47.4114, -9.2243) -> (-47.0627, -8.6787) centre (-47.5581, -8.7464) ccw projected
  arc A206 (-47.4114, -9.2243) -> (-51.1827, -11.4318) centre (-44.6198, -18.3188) ccw projected
  line L39 (-50.9691, -12.5516) -> (-51.1827, -11.4318) projected
  arc A207 (-50.9691, -12.5516) -> (-46.65, -13.2157) centre (-47.4023, -3.7322) ccw projected
  arc A208 (-46.125, -13.5947) -> (-46.65, -13.2157) centre (-46.6105, -13.7141) ccw projected
  arc A209 (-46.125, -13.5947) -> (-45.8857, -14.5265) centre (0, -2.2484) ccw projected
  arc A210 (-46.1633, -15.1116) -> (-45.8857, -14.5265) centre (-46.3687, -14.6557) ccw projected
  arc A211 (-46.1633, -15.1116) -> (-49.6281, -17.7743) centre (-42.2538, -23.7845) ccw projected
  line L40 (-49.2758, -18.8585) -> (-49.6281, -17.7743) projected
  arc A212 (-49.2758, -18.8585) -> (-44.9076, -18.976) centre (-46.8426, -9.6616) ccw projected
  arc A213 (-44.3392, -19.2862) -> (-44.9076, -18.976) centre (-44.8059, -19.4656) ccw projected
  arc A214 (-44.3392, -19.2862) -> (-43.985, -20.1807) centre (0, -2.2484) ccw projected
  arc A215 (-44.1871, -20.7959) -> (-43.985, -20.1807) centre (-44.4481, -20.3694) ccw projected
  arc A216 (-44.1871, -20.7959) -> (-47.2909, -23.8719) centre (-39.2214, -28.9105) ccw projected
  line L41 (-46.8055, -24.9034) -> (-47.2909, -23.8719) projected
  arc A217 (-46.8055, -24.9034) -> (-42.457, -24.4725) centre (-45.5441, -15.4741) ccw projected
  arc A218 (-41.8542, -24.7091) -> (-42.457, -24.4725) centre (-42.2947, -24.9455) ccw projected
  arc A219 (-41.8542, -24.7091) -> (-41.3907, -25.5521) centre (0, -2.2484) ccw projected
  arc A220 (-41.514, -26.1878) -> (-41.3907, -25.5521) centre (-41.8264, -25.7974) ccw projected
  arc A221 (-41.514, -26.1878) -> (-44.2078, -29.6285) centre (-35.5705, -33.616) ccw projected
  line L42 (-43.597, -30.591) -> (-44.2078, -29.6285) projected
  arc A222 (-43.597, -30.591) -> (-39.3368, -29.6186) centre (-43.5274, -21.078) ccw projected
  arc A223 (-38.7091, -29.7777) -> (-39.3368, -29.6186) centre (-39.1165, -30.0674) ccw projected
  arc A224 (-38.7091, -29.7777) -> (-38.1436, -30.5559) centre (0, -2.2484) ccw projected
  arc A225 (-38.1863, -31.2021) -> (-38.1436, -30.5559) centre (-38.5451, -30.8539) ccw projected
  arc A226 (-38.1863, -31.2021) -> (-40.4276, -34.9533) centre (-31.3586, -37.8268) ccw projected
  line L43 (-39.7009, -35.8317) -> (-40.4276, -34.9533) projected
  arc A227 (-39.7009, -35.8317) -> (-35.5962, -34.333) centre (-40.8242, -26.3849) ccw projected
  arc A228 (-34.9535, -34.4121) -> (-35.5962, -34.333) centre (-35.3214, -34.7507) ccw projected
  arc A229 (-34.9535, -34.4121) -> (-34.295, -35.1134) centre (0, -2.2484) ccw projected
  arc A230 (-34.2563, -35.7598) -> (-34.295, -35.1134) centre (-34.656, -35.4593) ccw projected
  arc A231 (-34.2563, -35.7598) -> (-36.0098, -39.7623) centre (-26.6522, -41.4765) ccw projected
  line L44 (-35.1788, -40.5427) -> (-36.0098, -39.7623) projected
  arc A232 (-35.1788, -40.5427) -> (-31.2943, -38.5413) centre (-37.4772, -31.3112) ccw projected
  arc A233 (-30.6467, -38.5393) -> (-31.2943, -38.5413) centre (-30.9693, -38.9213) ccw projected
  arc A234 (-30.6467, -38.5393) -> (-29.9055, -39.1525) centre (0, -2.2484) ccw projected
  arc A235 (-29.7861, -39.789) -> (-29.9055, -39.1525) centre (-30.2203, -39.541) ccw projected
  arc A236 (-29.7861, -39.789) -> (-31.0241, -43.9798) centre (-21.5255, -44.5076) ccw projected
  line L45 (-30.1019, -44.6498) -> (-31.0241, -43.9798) projected
  arc A237 (-30.1019, -44.6498) -> (-26.4988, -42.1774) centre (-33.5391, -35.7792) ccw projected
  arc A238 (-25.8566, -42.0942) -> (-26.4988, -42.1774) centre (-26.1288, -42.5137) ccw projected
  arc A239 (-25.8566, -42.0942) -> (-25.0443, -42.6097) centre (0, -2.2484) ccw projected
  arc A240 (-24.8461, -43.2262) -> (-25.0443, -42.6097) centre (-25.308, -43.0345) ccw projected
  arc A241 (-24.8461, -43.2262) -> (-25.5492, -47.539) centre (-16.0593, -46.8722) ccw projected
  line L46 (-24.5502, -48.0882) -> (-25.5492, -47.539) projected
  arc A242 (-24.5502, -48.0882) -> (-21.2854, -45.1837) centre (-29.0721, -39.7184) ccw projected
  arc A243 (-20.6587, -45.0207) -> (-21.2854, -45.1837) centre (-20.8762, -45.471) ccw projected
  arc A244 (-20.6587, -45.0207) -> (-19.7883, -45.4303) centre (0, -2.2484) ccw projected
  arc A245 (-19.5144, -46.0171) -> (-19.7883, -45.4303) centre (-19.9966, -45.8849) ccw projected
  arc A246 (-19.5144, -46.0171) -> (-19.6713, -50.3841) centre (-10.3398, -48.5331) ccw projected
  line L47 (-18.6114, -50.8037) -> (-19.6713, -50.3841) projected
  arc A247 (-18.6114, -50.8037) -> (-15.7364, -47.5129) centre (-24.1467, -43.0666) ccw projected
  arc A248 (-15.135, -47.2727) -> (-15.7364, -47.5129) centre (-15.2943, -47.7466) ccw projected
  arc A249 (-15.135, -47.2727) -> (-14.2201, -47.5699) centre (0, -2.2484) ccw projected
  arc A250 (-13.8748, -48.1178) -> (-14.2201, -47.5699) centre (-14.3698, -48.047) ccw projected
  arc A251 (-13.8748, -48.1178) -> (-13.4832, -52.47) centre (-4.4572, -49.4641) ccw projected
  line L48 (-12.379, -52.7535) -> (-13.4832, -52.47) projected
  arc A252 (-12.379, -52.7535) -> (-9.9391, -49.1283) centre (-18.8404, -45.7711) ccw projected
  arc A253 (-9.3726, -48.8146) -> (-9.9391, -49.1283) centre (-9.4713, -49.3047) ccw projected
  arc A254 (-9.3726, -48.8146) -> (-8.4277, -48.9948) centre (0, -2.2484) ccw projected
  arc A255 (-8.0165, -49.4951) -> (-8.4277, -48.9948) centre (-8.5164, -49.4869) ccw projected
  arc A256 (-8.0165, -49.4951) -> (-7.0824, -53.7639) centre (1.4956, -49.6504) ccw projected
  line L49 (-5.9514, -53.9067) -> (-7.0824, -53.7639) projected
  arc A257 (-5.9514, -53.9067) -> (-3.9852, -50.0043) centre (-13.237, -47.7893) ccw projected
  arc A258 (-3.4624, -49.6221) -> (-3.9852, -50.0043) centre (-3.4989, -50.1207) ccw projected
  arc A259 (-3.4624, -49.6221) -> (-2.5023, -49.6825) centre (0, -2.2484) ccw projected
  arc A260 (-2.0317, -50.1272) -> (-2.5023, -49.6825) centre (-2.5287, -50.1818) ccw projected
  circle A261 centre (0, -2.2484) radius 21
  circle A262 centre (0, 20.7516) radius 6.0312
  circle A263 centre (0, -25.2484) radius 6.0312
  point P0 (-5.3911, -22.5446)
  point P1 (5.3911, -22.5446)
  point P2 (5.3911, 18.0478)
  point P3 (-5.3911, 18.0478)
  dimension "d0" = 42
extrude "돌출1" add sketch "스케치1" along normal blind 1 contours A263 A5 A261 A262 A4 | A263 A5 | A262 A4 picked at (-0.1641, -18.7025) picked at (0.0932, 14.205)
fillet "모깎기1" radius 2 4 edges at (185.5791, 104.8522, -210.3653) (178.0106, 97.1727, -210.3653) (149.0992, 125.6661, -210.3653) (156.6677, 133.3456, -210.3653)
sketch "스케치2" plane through (168.9405, 113.6809, -209.8653) normal (0, 0, 1) x (0.7122354, -0.7019406, 0)
  arc A0 (-22.0831, 6.8982) -> (-21.4528, 4.687) centre (-20.1941, 6.2412) ccw projected
  arc A1 (-21.4528, -4.687) -> (-21.4528, 4.687) centre (-25.2484, 0) ccw projected
  arc A2 (-21.4528, -4.687) -> (-22.0831, -6.8982) centre (-20.1941, -6.2412) ccw projected
  arc A3 (-22.0831, -6.8982) -> (17.5862, -6.8982) centre (-2.2484, 0) ccw projected
  arc A4 (17.5862, -6.8982) -> (16.9559, -4.687) centre (15.6972, -6.2412) ccw projected
  arc A5 (16.9559, 4.687) -> (16.9559, -4.687) centre (20.7516, 0) ccw projected
  arc A6 (16.9559, 4.687) -> (17.5862, 6.8982) centre (15.6972, 6.2412) ccw projected
  arc A7 (17.5862, 6.8982) -> (-22.0831, 6.8982) centre (-2.2484, 0) ccw projected
  circle A8 centre (-14.8834, 12.8202) radius 1.6 projected
  circle A9 centre (10.3865, -12.8202) radius 1.6 projected
  circle A10 centre (-2.372, -16.9701) radius 1.6 projected
  circle A11 centre (-2.1249, 16.9701) radius 1.6 projected
  circle A12 centre (-15.0687, -12.6349) radius 1.6 projected
  circle A13 centre (10.5718, 12.6349) radius 1.6 projected
  circle A14 centre (-2.2484, 0) radius 13 projected
extrude "돌출2" add sketch "스케치2" along normal blind 1
properties part number "큰기어 와셔2t" material "알루미늄 6061"
